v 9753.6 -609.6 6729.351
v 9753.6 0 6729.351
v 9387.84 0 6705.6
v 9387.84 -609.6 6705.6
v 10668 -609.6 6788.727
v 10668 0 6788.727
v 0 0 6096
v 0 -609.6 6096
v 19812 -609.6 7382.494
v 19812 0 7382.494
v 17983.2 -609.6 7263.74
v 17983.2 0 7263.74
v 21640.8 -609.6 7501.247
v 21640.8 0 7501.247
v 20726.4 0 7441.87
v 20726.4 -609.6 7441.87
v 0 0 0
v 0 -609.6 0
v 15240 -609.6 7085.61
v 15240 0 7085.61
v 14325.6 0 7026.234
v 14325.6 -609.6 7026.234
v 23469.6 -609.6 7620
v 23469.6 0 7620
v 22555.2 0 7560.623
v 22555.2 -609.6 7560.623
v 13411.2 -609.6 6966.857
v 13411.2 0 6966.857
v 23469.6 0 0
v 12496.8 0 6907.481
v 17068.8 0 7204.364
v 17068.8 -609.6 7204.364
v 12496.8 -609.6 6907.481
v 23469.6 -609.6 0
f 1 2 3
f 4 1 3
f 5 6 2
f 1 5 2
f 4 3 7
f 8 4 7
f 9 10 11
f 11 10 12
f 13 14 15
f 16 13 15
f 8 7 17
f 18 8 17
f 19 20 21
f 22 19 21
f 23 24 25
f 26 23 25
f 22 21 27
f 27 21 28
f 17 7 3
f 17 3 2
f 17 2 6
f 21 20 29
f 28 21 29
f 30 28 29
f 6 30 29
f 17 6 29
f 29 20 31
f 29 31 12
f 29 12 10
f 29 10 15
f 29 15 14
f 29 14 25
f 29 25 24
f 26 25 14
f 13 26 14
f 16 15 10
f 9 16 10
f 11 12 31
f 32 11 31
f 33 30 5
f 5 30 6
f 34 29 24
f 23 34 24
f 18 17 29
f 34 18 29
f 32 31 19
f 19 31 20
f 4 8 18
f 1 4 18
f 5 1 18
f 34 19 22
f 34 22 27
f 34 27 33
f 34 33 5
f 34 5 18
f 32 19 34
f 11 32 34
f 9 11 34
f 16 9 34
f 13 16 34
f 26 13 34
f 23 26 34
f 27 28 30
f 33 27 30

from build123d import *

# Parameters (mm, degrees)
F0_W     = 914.4
F0_H     = 6705.6
F1_DEPTH = 609.6


with BuildPart() as f1:
    # F0 (on Front) → F1 (new body)
    with BuildSketch(Plane.XZ):
        Polygon((0, 6096), (0, 0), (9753.6, 0), (9753.6, 6705.6), (9387.84, 6705.6), align=None)
        with Locations((10210.8, 3352.8)):
            Rectangle(F0_W, F0_H)
        with Locations((11125.2, 3352.8)):
            Rectangle(F0_W, F0_H)
        Polygon((9753.6, 6729.350649), (9753.6, 6705.6), (10668, 6705.6), (10668, 6788.727273), align=None)
        Polygon((9387.84, 6705.6), (9753.6, 6705.6), (9753.6, 6729.350649), align=None)
        with Locations((12039.6, 3352.8)):
            Rectangle(F0_W, F0_H)
        Polygon((10668, 6788.727273), (10668, 6705.6), (11582.4, 6705.6), (11582.4, 6848.103896), align=None)
        with Locations((12954, 3352.8)):
            Rectangle(F0_W, F0_H)
        Polygon((11582.4, 6848.103896), (11582.4, 6705.6), (12496.8, 6705.6), (12496.8, 6907.480519), align=None)
        with Locations((13868.4, 3352.8)):
            Rectangle(F0_W, F0_H)
        Polygon((12496.8, 6907.480519), (12496.8, 6705.6), (13411.2, 6705.6), (13411.2, 6966.857143), align=None)
        with Locations((14782.8, 3352.8)):
            Rectangle(F0_W, F0_H)
        Polygon((13411.2, 6966.857143), (13411.2, 6705.6), (14325.6, 6705.6), (14325.6, 7026.233766), align=None)
        with Locations((15697.2, 3352.8)):
            Rectangle(F0_W, F0_H)
        Polygon((14325.6, 7026.233766), (14325.6, 6705.6), (15240, 6705.6), (15240, 7085.61039), align=None)
        with Locations((16611.6, 3352.8)):
            Rectangle(F0_W, F0_H)
        Polygon((15240, 7085.61039), (15240, 6705.6), (16154.4, 6705.6), (16154.4, 7144.987013), align=None)
        with Locations((17526, 3352.8)):
            Rectangle(F0_W, F0_H)
        Polygon((16154.4, 7144.987013), (16154.4, 6705.6), (17068.8, 6705.6), (17068.8, 7204.363636), align=None)
        with Locations((18440.4, 3352.8)):
            Rectangle(F0_W, F0_H)
        Polygon((17068.8, 7204.363636), (17068.8, 6705.6), (17983.2, 6705.6), (17983.2, 7263.74026), align=None)
        with Locations((19354.8, 3352.8)):
            Rectangle(F0_W, F0_H)
        Polygon((17983.2, 7263.74026), (17983.2, 6705.6), (18897.6, 6705.6), (18897.6, 7323.116883), align=None)
        with Locations((20269.2, 3352.8)):
            Rectangle(F0_W, F0_H)
        Polygon((18897.6, 7323.116883), (18897.6, 6705.6), (19812, 6705.6), (19812, 7382.493506), align=None)
        with Locations((21183.6, 3352.8)):
            Rectangle(F0_W, F0_H)
        Polygon((19812, 7382.493506), (19812, 6705.6), (20726.4, 6705.6), (20726.4, 7441.87013), align=None)
        with Locations((22098, 3352.8)):
            Rectangle(F0_W, F0_H)
        Polygon((20726.4, 7441.87013), (20726.4, 6705.6), (21640.8, 6705.6), (21640.8, 7501.246753), align=None)
        with Locations((23012.4, 3352.8)):
            Rectangle(F0_W, F0_H)
        Polygon((21640.8, 7501.246753), (21640.8, 6705.6), (22555.2, 6705.6), (22555.2, 7560.623377), align=None)
        Polygon((22555.2, 7560.623377), (22555.2, 6705.6), (23469.6, 6705.6), (23469.6, 7620), align=None)
    extrude(amount=F1_DEPTH)


solid = f1.part
